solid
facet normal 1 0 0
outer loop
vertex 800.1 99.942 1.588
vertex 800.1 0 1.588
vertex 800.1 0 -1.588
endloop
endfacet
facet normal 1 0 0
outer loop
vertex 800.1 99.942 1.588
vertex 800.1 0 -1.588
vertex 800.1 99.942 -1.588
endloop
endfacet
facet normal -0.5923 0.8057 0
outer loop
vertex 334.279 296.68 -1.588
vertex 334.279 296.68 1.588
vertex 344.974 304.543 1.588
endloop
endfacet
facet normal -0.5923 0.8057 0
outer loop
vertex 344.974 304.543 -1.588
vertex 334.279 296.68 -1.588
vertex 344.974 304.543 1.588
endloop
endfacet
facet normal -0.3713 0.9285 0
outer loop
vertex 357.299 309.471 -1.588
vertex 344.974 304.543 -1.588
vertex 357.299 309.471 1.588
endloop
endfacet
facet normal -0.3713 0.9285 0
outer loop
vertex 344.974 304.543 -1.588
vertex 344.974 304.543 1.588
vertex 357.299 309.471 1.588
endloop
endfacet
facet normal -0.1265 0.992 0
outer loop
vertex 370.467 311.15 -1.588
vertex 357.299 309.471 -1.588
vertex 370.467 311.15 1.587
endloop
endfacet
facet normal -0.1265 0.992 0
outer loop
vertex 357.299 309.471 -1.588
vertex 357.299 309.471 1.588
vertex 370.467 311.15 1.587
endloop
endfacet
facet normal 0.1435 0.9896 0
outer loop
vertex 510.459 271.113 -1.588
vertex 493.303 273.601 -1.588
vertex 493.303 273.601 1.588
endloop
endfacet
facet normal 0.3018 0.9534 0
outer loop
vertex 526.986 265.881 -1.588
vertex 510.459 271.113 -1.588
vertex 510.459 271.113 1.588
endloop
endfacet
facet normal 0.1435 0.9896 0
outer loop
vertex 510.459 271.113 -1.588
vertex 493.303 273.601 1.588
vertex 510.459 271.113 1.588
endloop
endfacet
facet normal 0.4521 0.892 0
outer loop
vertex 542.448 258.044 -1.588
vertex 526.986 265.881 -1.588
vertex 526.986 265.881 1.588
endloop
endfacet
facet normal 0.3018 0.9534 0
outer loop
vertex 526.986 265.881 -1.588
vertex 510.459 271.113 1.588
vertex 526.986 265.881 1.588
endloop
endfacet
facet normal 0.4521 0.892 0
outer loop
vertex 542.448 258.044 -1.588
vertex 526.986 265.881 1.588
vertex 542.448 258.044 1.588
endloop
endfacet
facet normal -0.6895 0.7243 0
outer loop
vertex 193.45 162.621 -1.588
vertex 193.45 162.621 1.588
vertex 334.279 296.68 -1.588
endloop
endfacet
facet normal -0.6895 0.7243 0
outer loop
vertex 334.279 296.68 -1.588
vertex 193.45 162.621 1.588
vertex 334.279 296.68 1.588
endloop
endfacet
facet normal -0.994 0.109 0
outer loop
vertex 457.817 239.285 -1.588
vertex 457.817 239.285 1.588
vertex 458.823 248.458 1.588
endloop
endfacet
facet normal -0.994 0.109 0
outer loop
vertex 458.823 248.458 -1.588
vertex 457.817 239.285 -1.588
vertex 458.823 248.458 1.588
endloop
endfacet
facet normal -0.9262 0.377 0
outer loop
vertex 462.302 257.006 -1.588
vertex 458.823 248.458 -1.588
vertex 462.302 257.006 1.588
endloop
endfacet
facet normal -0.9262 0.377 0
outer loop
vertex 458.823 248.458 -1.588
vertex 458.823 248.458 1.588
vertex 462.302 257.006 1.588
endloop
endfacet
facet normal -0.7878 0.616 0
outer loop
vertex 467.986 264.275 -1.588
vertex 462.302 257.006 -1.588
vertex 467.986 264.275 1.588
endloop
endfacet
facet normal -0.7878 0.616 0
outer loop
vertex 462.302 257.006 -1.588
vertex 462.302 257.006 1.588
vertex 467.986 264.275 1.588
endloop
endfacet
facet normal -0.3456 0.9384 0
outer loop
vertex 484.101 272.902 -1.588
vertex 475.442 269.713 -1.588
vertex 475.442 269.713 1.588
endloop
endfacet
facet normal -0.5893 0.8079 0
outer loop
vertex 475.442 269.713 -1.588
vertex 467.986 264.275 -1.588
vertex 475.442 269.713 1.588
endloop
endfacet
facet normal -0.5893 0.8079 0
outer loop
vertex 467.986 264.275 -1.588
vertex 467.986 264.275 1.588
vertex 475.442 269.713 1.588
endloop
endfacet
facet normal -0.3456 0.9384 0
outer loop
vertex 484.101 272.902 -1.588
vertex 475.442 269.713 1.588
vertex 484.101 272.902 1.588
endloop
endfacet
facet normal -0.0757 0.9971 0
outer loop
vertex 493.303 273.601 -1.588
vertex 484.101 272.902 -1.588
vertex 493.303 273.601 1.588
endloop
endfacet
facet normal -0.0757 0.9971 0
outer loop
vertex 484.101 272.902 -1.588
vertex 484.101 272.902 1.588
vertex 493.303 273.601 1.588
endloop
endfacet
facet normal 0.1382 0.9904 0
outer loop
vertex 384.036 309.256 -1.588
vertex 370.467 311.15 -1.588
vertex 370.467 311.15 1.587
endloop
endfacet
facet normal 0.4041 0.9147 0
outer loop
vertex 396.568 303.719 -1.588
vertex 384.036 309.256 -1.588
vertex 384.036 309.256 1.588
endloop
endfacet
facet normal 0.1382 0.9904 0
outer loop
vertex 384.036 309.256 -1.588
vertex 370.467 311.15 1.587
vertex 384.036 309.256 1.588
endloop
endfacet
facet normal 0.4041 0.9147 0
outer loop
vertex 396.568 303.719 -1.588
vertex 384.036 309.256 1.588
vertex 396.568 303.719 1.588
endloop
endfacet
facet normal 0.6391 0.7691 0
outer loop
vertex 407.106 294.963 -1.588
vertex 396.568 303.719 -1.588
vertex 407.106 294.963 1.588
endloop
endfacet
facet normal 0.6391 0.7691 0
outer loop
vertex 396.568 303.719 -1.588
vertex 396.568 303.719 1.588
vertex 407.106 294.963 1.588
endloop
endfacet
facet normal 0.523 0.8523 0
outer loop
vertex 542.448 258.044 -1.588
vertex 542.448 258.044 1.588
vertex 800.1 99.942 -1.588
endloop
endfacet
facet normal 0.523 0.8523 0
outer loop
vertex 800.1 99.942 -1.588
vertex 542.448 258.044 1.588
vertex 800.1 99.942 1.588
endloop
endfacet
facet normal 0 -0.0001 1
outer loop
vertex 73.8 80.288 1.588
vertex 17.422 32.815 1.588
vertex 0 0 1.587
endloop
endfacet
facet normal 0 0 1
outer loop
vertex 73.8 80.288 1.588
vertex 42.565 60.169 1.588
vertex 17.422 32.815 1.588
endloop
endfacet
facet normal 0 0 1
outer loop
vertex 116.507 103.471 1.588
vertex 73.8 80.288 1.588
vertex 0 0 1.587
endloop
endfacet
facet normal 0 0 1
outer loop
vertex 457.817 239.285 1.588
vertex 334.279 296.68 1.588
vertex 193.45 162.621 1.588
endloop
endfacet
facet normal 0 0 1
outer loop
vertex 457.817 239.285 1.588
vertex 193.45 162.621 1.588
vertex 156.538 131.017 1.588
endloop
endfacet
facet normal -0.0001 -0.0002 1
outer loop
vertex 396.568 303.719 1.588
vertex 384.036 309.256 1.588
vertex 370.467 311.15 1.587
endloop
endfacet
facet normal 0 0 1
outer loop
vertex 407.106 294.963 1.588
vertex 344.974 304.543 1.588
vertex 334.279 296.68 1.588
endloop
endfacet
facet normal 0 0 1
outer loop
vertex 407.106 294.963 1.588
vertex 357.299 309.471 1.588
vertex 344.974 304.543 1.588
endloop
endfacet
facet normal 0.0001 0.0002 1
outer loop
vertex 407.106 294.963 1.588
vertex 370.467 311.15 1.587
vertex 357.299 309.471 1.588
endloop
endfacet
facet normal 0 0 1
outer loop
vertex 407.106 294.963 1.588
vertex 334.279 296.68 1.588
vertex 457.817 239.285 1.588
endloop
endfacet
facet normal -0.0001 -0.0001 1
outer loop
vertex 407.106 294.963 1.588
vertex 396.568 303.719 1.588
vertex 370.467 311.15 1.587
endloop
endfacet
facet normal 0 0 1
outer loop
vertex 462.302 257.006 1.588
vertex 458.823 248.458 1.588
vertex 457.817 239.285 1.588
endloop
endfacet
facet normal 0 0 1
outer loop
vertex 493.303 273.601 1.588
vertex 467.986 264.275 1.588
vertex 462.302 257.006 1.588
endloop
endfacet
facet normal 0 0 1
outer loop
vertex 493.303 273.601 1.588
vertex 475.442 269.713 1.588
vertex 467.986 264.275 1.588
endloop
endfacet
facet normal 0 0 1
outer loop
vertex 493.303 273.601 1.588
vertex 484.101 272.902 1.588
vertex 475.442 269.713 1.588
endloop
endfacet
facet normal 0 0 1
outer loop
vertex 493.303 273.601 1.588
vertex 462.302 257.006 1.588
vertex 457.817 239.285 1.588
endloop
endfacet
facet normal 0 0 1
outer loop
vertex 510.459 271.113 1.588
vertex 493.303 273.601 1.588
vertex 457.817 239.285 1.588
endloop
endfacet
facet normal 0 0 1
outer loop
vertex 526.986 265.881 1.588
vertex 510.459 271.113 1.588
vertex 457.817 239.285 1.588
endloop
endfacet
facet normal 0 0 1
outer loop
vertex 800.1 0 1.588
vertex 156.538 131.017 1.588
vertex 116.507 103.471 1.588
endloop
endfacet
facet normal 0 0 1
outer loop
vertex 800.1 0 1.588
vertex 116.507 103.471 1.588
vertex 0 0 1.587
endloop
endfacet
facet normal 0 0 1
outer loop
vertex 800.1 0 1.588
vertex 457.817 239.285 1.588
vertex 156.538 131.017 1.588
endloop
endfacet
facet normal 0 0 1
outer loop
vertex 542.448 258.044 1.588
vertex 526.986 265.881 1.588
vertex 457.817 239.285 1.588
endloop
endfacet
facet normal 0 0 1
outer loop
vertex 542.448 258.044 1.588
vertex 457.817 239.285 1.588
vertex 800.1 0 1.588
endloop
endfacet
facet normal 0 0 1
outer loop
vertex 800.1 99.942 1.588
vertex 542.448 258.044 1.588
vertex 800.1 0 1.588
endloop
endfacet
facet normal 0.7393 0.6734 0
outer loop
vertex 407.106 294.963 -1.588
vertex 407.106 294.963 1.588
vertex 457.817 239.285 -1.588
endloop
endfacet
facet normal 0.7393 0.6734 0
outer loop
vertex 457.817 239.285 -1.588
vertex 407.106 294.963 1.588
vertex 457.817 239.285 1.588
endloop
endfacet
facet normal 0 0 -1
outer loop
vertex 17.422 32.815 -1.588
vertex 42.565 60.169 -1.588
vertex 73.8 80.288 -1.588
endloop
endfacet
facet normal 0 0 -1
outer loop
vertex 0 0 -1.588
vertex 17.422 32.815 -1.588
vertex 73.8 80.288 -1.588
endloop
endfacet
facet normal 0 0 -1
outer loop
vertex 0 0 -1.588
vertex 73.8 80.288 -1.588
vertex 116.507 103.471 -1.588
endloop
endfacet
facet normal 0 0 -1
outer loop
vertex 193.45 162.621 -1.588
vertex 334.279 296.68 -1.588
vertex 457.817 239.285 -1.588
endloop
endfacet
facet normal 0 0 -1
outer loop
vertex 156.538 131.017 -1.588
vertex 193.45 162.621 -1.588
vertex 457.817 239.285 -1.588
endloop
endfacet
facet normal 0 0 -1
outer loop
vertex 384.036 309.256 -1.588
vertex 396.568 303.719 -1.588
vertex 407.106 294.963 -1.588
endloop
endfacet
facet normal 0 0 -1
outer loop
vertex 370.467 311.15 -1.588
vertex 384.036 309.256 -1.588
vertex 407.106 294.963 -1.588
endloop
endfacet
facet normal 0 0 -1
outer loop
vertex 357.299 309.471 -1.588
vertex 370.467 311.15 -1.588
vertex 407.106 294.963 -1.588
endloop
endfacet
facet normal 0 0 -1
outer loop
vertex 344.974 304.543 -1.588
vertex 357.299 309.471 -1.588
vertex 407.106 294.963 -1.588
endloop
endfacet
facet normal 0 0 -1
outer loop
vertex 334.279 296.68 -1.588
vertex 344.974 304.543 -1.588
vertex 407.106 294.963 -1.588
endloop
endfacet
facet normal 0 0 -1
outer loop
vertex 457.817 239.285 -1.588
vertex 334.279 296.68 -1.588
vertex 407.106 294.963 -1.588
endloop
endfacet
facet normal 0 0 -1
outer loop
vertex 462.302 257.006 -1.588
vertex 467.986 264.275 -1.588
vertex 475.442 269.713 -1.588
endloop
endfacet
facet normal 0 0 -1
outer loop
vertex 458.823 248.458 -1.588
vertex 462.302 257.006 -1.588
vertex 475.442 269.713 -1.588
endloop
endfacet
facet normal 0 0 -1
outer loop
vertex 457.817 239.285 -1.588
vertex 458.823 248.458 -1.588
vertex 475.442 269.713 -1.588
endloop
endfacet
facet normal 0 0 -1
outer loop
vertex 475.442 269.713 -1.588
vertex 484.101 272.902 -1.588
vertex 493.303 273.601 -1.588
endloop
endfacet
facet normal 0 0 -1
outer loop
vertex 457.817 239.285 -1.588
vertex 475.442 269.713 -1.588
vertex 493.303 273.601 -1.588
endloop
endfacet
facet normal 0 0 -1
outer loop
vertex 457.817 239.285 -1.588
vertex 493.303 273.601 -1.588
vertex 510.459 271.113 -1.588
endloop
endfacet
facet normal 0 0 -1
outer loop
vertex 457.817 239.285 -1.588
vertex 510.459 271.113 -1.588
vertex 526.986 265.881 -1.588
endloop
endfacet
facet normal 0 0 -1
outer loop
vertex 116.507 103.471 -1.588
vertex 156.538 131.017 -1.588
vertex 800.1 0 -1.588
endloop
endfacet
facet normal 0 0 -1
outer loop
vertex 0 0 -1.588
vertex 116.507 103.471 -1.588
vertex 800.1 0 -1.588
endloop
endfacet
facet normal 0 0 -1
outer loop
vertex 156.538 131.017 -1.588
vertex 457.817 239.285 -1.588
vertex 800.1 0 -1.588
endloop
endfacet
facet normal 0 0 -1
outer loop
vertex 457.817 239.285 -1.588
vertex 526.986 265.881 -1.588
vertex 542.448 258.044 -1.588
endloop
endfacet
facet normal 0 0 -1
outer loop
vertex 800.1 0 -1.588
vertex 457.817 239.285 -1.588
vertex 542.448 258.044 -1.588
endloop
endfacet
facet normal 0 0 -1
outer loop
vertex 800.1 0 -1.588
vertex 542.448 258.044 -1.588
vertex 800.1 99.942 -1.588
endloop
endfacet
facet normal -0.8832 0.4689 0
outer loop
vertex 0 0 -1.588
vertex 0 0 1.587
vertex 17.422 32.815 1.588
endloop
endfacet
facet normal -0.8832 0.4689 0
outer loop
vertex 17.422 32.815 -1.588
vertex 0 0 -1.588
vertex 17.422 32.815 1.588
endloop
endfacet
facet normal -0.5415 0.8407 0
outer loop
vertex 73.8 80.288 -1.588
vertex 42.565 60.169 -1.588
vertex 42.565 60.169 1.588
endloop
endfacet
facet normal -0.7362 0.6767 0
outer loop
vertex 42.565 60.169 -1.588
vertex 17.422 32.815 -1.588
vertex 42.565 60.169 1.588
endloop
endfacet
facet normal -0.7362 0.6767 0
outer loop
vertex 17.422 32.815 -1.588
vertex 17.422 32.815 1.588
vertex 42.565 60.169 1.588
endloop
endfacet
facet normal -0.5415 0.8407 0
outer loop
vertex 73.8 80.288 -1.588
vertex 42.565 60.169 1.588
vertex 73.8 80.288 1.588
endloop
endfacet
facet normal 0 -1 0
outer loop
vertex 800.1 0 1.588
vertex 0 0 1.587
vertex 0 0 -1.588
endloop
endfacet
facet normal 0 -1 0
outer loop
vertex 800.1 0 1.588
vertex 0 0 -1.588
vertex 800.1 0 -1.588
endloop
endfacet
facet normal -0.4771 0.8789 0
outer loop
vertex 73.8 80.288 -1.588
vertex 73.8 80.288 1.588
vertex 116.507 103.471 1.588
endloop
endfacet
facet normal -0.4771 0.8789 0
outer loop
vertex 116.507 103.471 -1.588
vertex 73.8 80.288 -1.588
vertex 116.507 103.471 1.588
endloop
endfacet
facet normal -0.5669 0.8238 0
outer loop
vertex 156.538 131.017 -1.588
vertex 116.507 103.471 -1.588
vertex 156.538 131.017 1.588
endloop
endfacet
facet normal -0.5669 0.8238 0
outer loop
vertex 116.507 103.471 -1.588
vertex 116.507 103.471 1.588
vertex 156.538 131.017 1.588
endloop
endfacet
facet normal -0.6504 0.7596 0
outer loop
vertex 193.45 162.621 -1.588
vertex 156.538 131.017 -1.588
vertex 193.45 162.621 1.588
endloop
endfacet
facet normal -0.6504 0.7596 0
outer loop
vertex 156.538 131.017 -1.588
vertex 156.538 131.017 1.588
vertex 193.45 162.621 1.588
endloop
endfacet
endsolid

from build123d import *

# Parameters (mm, degrees)
SKETCH1_W           = 800.1
SKETCH1_H           = 311.15
BOSS_EXTRUDE1_DEPTH = 1.5875
CUT_EXTRUDE1_DEPTH  = 859.477963098


with BuildPart() as part:
    # Sketch1 → Boss-Extrude1 (new, symmetric)
    with BuildSketch(Plane.XY):
        with Locations((400.05, 155.575)):
            Rectangle(SKETCH1_W, SKETCH1_H)
    extrude(amount=BOSS_EXTRUDE1_DEPTH, both=True)

    # Sketch2 → Cut-Extrude1 (cut, through all)
    with BuildSketch(Plane.XY.offset(1.5875)):
        with BuildLine():
            ThreePointArc((73.799735787, 80.288462856), (136.885533296, 116.716615986), (193.450443102, 162.621290763))
            Line((193.450443102, 162.621290763), (334.279123198, 296.679860281))
            ThreePointArc((334.279123198, 296.679860281), (350.98014935, 307.39838407), (370.46697579, 311.15))
            Line((370.46697579, 311.15), (0, 311.15))
            Line((0, 311.15), (0, 0))
            ThreePointArc((0, 0), (29.11988212, 47.295456823), (73.799735787, 80.288462856))
        make_face()
        with BuildLine():
            Line((800.1, 311.15), (370.46697579, 311.15))
            ThreePointArc((370.46697579, 311.15), (390.494645186, 306.92285828), (407.105710958, 294.962558849))
            Line((407.105710958, 294.962558849), (457.816588668, 239.285045675))
            ThreePointArc((457.816588668, 239.285045675), (467.985750385, 264.275368722), (493.30296488, 273.60096502))
            ThreePointArc((493.30296488, 273.60096502), (518.828524121, 268.832657986), (542.448186048, 258.0436591))
            Line((542.448186048, 258.0436591), (800.1, 99.941615608))
            Line((800.1, 99.941615608), (800.1, 311.15))
        make_face()
    extrude(amount=-CUT_EXTRUDE1_DEPTH, mode=Mode.SUBTRACT)


solid = part.part
